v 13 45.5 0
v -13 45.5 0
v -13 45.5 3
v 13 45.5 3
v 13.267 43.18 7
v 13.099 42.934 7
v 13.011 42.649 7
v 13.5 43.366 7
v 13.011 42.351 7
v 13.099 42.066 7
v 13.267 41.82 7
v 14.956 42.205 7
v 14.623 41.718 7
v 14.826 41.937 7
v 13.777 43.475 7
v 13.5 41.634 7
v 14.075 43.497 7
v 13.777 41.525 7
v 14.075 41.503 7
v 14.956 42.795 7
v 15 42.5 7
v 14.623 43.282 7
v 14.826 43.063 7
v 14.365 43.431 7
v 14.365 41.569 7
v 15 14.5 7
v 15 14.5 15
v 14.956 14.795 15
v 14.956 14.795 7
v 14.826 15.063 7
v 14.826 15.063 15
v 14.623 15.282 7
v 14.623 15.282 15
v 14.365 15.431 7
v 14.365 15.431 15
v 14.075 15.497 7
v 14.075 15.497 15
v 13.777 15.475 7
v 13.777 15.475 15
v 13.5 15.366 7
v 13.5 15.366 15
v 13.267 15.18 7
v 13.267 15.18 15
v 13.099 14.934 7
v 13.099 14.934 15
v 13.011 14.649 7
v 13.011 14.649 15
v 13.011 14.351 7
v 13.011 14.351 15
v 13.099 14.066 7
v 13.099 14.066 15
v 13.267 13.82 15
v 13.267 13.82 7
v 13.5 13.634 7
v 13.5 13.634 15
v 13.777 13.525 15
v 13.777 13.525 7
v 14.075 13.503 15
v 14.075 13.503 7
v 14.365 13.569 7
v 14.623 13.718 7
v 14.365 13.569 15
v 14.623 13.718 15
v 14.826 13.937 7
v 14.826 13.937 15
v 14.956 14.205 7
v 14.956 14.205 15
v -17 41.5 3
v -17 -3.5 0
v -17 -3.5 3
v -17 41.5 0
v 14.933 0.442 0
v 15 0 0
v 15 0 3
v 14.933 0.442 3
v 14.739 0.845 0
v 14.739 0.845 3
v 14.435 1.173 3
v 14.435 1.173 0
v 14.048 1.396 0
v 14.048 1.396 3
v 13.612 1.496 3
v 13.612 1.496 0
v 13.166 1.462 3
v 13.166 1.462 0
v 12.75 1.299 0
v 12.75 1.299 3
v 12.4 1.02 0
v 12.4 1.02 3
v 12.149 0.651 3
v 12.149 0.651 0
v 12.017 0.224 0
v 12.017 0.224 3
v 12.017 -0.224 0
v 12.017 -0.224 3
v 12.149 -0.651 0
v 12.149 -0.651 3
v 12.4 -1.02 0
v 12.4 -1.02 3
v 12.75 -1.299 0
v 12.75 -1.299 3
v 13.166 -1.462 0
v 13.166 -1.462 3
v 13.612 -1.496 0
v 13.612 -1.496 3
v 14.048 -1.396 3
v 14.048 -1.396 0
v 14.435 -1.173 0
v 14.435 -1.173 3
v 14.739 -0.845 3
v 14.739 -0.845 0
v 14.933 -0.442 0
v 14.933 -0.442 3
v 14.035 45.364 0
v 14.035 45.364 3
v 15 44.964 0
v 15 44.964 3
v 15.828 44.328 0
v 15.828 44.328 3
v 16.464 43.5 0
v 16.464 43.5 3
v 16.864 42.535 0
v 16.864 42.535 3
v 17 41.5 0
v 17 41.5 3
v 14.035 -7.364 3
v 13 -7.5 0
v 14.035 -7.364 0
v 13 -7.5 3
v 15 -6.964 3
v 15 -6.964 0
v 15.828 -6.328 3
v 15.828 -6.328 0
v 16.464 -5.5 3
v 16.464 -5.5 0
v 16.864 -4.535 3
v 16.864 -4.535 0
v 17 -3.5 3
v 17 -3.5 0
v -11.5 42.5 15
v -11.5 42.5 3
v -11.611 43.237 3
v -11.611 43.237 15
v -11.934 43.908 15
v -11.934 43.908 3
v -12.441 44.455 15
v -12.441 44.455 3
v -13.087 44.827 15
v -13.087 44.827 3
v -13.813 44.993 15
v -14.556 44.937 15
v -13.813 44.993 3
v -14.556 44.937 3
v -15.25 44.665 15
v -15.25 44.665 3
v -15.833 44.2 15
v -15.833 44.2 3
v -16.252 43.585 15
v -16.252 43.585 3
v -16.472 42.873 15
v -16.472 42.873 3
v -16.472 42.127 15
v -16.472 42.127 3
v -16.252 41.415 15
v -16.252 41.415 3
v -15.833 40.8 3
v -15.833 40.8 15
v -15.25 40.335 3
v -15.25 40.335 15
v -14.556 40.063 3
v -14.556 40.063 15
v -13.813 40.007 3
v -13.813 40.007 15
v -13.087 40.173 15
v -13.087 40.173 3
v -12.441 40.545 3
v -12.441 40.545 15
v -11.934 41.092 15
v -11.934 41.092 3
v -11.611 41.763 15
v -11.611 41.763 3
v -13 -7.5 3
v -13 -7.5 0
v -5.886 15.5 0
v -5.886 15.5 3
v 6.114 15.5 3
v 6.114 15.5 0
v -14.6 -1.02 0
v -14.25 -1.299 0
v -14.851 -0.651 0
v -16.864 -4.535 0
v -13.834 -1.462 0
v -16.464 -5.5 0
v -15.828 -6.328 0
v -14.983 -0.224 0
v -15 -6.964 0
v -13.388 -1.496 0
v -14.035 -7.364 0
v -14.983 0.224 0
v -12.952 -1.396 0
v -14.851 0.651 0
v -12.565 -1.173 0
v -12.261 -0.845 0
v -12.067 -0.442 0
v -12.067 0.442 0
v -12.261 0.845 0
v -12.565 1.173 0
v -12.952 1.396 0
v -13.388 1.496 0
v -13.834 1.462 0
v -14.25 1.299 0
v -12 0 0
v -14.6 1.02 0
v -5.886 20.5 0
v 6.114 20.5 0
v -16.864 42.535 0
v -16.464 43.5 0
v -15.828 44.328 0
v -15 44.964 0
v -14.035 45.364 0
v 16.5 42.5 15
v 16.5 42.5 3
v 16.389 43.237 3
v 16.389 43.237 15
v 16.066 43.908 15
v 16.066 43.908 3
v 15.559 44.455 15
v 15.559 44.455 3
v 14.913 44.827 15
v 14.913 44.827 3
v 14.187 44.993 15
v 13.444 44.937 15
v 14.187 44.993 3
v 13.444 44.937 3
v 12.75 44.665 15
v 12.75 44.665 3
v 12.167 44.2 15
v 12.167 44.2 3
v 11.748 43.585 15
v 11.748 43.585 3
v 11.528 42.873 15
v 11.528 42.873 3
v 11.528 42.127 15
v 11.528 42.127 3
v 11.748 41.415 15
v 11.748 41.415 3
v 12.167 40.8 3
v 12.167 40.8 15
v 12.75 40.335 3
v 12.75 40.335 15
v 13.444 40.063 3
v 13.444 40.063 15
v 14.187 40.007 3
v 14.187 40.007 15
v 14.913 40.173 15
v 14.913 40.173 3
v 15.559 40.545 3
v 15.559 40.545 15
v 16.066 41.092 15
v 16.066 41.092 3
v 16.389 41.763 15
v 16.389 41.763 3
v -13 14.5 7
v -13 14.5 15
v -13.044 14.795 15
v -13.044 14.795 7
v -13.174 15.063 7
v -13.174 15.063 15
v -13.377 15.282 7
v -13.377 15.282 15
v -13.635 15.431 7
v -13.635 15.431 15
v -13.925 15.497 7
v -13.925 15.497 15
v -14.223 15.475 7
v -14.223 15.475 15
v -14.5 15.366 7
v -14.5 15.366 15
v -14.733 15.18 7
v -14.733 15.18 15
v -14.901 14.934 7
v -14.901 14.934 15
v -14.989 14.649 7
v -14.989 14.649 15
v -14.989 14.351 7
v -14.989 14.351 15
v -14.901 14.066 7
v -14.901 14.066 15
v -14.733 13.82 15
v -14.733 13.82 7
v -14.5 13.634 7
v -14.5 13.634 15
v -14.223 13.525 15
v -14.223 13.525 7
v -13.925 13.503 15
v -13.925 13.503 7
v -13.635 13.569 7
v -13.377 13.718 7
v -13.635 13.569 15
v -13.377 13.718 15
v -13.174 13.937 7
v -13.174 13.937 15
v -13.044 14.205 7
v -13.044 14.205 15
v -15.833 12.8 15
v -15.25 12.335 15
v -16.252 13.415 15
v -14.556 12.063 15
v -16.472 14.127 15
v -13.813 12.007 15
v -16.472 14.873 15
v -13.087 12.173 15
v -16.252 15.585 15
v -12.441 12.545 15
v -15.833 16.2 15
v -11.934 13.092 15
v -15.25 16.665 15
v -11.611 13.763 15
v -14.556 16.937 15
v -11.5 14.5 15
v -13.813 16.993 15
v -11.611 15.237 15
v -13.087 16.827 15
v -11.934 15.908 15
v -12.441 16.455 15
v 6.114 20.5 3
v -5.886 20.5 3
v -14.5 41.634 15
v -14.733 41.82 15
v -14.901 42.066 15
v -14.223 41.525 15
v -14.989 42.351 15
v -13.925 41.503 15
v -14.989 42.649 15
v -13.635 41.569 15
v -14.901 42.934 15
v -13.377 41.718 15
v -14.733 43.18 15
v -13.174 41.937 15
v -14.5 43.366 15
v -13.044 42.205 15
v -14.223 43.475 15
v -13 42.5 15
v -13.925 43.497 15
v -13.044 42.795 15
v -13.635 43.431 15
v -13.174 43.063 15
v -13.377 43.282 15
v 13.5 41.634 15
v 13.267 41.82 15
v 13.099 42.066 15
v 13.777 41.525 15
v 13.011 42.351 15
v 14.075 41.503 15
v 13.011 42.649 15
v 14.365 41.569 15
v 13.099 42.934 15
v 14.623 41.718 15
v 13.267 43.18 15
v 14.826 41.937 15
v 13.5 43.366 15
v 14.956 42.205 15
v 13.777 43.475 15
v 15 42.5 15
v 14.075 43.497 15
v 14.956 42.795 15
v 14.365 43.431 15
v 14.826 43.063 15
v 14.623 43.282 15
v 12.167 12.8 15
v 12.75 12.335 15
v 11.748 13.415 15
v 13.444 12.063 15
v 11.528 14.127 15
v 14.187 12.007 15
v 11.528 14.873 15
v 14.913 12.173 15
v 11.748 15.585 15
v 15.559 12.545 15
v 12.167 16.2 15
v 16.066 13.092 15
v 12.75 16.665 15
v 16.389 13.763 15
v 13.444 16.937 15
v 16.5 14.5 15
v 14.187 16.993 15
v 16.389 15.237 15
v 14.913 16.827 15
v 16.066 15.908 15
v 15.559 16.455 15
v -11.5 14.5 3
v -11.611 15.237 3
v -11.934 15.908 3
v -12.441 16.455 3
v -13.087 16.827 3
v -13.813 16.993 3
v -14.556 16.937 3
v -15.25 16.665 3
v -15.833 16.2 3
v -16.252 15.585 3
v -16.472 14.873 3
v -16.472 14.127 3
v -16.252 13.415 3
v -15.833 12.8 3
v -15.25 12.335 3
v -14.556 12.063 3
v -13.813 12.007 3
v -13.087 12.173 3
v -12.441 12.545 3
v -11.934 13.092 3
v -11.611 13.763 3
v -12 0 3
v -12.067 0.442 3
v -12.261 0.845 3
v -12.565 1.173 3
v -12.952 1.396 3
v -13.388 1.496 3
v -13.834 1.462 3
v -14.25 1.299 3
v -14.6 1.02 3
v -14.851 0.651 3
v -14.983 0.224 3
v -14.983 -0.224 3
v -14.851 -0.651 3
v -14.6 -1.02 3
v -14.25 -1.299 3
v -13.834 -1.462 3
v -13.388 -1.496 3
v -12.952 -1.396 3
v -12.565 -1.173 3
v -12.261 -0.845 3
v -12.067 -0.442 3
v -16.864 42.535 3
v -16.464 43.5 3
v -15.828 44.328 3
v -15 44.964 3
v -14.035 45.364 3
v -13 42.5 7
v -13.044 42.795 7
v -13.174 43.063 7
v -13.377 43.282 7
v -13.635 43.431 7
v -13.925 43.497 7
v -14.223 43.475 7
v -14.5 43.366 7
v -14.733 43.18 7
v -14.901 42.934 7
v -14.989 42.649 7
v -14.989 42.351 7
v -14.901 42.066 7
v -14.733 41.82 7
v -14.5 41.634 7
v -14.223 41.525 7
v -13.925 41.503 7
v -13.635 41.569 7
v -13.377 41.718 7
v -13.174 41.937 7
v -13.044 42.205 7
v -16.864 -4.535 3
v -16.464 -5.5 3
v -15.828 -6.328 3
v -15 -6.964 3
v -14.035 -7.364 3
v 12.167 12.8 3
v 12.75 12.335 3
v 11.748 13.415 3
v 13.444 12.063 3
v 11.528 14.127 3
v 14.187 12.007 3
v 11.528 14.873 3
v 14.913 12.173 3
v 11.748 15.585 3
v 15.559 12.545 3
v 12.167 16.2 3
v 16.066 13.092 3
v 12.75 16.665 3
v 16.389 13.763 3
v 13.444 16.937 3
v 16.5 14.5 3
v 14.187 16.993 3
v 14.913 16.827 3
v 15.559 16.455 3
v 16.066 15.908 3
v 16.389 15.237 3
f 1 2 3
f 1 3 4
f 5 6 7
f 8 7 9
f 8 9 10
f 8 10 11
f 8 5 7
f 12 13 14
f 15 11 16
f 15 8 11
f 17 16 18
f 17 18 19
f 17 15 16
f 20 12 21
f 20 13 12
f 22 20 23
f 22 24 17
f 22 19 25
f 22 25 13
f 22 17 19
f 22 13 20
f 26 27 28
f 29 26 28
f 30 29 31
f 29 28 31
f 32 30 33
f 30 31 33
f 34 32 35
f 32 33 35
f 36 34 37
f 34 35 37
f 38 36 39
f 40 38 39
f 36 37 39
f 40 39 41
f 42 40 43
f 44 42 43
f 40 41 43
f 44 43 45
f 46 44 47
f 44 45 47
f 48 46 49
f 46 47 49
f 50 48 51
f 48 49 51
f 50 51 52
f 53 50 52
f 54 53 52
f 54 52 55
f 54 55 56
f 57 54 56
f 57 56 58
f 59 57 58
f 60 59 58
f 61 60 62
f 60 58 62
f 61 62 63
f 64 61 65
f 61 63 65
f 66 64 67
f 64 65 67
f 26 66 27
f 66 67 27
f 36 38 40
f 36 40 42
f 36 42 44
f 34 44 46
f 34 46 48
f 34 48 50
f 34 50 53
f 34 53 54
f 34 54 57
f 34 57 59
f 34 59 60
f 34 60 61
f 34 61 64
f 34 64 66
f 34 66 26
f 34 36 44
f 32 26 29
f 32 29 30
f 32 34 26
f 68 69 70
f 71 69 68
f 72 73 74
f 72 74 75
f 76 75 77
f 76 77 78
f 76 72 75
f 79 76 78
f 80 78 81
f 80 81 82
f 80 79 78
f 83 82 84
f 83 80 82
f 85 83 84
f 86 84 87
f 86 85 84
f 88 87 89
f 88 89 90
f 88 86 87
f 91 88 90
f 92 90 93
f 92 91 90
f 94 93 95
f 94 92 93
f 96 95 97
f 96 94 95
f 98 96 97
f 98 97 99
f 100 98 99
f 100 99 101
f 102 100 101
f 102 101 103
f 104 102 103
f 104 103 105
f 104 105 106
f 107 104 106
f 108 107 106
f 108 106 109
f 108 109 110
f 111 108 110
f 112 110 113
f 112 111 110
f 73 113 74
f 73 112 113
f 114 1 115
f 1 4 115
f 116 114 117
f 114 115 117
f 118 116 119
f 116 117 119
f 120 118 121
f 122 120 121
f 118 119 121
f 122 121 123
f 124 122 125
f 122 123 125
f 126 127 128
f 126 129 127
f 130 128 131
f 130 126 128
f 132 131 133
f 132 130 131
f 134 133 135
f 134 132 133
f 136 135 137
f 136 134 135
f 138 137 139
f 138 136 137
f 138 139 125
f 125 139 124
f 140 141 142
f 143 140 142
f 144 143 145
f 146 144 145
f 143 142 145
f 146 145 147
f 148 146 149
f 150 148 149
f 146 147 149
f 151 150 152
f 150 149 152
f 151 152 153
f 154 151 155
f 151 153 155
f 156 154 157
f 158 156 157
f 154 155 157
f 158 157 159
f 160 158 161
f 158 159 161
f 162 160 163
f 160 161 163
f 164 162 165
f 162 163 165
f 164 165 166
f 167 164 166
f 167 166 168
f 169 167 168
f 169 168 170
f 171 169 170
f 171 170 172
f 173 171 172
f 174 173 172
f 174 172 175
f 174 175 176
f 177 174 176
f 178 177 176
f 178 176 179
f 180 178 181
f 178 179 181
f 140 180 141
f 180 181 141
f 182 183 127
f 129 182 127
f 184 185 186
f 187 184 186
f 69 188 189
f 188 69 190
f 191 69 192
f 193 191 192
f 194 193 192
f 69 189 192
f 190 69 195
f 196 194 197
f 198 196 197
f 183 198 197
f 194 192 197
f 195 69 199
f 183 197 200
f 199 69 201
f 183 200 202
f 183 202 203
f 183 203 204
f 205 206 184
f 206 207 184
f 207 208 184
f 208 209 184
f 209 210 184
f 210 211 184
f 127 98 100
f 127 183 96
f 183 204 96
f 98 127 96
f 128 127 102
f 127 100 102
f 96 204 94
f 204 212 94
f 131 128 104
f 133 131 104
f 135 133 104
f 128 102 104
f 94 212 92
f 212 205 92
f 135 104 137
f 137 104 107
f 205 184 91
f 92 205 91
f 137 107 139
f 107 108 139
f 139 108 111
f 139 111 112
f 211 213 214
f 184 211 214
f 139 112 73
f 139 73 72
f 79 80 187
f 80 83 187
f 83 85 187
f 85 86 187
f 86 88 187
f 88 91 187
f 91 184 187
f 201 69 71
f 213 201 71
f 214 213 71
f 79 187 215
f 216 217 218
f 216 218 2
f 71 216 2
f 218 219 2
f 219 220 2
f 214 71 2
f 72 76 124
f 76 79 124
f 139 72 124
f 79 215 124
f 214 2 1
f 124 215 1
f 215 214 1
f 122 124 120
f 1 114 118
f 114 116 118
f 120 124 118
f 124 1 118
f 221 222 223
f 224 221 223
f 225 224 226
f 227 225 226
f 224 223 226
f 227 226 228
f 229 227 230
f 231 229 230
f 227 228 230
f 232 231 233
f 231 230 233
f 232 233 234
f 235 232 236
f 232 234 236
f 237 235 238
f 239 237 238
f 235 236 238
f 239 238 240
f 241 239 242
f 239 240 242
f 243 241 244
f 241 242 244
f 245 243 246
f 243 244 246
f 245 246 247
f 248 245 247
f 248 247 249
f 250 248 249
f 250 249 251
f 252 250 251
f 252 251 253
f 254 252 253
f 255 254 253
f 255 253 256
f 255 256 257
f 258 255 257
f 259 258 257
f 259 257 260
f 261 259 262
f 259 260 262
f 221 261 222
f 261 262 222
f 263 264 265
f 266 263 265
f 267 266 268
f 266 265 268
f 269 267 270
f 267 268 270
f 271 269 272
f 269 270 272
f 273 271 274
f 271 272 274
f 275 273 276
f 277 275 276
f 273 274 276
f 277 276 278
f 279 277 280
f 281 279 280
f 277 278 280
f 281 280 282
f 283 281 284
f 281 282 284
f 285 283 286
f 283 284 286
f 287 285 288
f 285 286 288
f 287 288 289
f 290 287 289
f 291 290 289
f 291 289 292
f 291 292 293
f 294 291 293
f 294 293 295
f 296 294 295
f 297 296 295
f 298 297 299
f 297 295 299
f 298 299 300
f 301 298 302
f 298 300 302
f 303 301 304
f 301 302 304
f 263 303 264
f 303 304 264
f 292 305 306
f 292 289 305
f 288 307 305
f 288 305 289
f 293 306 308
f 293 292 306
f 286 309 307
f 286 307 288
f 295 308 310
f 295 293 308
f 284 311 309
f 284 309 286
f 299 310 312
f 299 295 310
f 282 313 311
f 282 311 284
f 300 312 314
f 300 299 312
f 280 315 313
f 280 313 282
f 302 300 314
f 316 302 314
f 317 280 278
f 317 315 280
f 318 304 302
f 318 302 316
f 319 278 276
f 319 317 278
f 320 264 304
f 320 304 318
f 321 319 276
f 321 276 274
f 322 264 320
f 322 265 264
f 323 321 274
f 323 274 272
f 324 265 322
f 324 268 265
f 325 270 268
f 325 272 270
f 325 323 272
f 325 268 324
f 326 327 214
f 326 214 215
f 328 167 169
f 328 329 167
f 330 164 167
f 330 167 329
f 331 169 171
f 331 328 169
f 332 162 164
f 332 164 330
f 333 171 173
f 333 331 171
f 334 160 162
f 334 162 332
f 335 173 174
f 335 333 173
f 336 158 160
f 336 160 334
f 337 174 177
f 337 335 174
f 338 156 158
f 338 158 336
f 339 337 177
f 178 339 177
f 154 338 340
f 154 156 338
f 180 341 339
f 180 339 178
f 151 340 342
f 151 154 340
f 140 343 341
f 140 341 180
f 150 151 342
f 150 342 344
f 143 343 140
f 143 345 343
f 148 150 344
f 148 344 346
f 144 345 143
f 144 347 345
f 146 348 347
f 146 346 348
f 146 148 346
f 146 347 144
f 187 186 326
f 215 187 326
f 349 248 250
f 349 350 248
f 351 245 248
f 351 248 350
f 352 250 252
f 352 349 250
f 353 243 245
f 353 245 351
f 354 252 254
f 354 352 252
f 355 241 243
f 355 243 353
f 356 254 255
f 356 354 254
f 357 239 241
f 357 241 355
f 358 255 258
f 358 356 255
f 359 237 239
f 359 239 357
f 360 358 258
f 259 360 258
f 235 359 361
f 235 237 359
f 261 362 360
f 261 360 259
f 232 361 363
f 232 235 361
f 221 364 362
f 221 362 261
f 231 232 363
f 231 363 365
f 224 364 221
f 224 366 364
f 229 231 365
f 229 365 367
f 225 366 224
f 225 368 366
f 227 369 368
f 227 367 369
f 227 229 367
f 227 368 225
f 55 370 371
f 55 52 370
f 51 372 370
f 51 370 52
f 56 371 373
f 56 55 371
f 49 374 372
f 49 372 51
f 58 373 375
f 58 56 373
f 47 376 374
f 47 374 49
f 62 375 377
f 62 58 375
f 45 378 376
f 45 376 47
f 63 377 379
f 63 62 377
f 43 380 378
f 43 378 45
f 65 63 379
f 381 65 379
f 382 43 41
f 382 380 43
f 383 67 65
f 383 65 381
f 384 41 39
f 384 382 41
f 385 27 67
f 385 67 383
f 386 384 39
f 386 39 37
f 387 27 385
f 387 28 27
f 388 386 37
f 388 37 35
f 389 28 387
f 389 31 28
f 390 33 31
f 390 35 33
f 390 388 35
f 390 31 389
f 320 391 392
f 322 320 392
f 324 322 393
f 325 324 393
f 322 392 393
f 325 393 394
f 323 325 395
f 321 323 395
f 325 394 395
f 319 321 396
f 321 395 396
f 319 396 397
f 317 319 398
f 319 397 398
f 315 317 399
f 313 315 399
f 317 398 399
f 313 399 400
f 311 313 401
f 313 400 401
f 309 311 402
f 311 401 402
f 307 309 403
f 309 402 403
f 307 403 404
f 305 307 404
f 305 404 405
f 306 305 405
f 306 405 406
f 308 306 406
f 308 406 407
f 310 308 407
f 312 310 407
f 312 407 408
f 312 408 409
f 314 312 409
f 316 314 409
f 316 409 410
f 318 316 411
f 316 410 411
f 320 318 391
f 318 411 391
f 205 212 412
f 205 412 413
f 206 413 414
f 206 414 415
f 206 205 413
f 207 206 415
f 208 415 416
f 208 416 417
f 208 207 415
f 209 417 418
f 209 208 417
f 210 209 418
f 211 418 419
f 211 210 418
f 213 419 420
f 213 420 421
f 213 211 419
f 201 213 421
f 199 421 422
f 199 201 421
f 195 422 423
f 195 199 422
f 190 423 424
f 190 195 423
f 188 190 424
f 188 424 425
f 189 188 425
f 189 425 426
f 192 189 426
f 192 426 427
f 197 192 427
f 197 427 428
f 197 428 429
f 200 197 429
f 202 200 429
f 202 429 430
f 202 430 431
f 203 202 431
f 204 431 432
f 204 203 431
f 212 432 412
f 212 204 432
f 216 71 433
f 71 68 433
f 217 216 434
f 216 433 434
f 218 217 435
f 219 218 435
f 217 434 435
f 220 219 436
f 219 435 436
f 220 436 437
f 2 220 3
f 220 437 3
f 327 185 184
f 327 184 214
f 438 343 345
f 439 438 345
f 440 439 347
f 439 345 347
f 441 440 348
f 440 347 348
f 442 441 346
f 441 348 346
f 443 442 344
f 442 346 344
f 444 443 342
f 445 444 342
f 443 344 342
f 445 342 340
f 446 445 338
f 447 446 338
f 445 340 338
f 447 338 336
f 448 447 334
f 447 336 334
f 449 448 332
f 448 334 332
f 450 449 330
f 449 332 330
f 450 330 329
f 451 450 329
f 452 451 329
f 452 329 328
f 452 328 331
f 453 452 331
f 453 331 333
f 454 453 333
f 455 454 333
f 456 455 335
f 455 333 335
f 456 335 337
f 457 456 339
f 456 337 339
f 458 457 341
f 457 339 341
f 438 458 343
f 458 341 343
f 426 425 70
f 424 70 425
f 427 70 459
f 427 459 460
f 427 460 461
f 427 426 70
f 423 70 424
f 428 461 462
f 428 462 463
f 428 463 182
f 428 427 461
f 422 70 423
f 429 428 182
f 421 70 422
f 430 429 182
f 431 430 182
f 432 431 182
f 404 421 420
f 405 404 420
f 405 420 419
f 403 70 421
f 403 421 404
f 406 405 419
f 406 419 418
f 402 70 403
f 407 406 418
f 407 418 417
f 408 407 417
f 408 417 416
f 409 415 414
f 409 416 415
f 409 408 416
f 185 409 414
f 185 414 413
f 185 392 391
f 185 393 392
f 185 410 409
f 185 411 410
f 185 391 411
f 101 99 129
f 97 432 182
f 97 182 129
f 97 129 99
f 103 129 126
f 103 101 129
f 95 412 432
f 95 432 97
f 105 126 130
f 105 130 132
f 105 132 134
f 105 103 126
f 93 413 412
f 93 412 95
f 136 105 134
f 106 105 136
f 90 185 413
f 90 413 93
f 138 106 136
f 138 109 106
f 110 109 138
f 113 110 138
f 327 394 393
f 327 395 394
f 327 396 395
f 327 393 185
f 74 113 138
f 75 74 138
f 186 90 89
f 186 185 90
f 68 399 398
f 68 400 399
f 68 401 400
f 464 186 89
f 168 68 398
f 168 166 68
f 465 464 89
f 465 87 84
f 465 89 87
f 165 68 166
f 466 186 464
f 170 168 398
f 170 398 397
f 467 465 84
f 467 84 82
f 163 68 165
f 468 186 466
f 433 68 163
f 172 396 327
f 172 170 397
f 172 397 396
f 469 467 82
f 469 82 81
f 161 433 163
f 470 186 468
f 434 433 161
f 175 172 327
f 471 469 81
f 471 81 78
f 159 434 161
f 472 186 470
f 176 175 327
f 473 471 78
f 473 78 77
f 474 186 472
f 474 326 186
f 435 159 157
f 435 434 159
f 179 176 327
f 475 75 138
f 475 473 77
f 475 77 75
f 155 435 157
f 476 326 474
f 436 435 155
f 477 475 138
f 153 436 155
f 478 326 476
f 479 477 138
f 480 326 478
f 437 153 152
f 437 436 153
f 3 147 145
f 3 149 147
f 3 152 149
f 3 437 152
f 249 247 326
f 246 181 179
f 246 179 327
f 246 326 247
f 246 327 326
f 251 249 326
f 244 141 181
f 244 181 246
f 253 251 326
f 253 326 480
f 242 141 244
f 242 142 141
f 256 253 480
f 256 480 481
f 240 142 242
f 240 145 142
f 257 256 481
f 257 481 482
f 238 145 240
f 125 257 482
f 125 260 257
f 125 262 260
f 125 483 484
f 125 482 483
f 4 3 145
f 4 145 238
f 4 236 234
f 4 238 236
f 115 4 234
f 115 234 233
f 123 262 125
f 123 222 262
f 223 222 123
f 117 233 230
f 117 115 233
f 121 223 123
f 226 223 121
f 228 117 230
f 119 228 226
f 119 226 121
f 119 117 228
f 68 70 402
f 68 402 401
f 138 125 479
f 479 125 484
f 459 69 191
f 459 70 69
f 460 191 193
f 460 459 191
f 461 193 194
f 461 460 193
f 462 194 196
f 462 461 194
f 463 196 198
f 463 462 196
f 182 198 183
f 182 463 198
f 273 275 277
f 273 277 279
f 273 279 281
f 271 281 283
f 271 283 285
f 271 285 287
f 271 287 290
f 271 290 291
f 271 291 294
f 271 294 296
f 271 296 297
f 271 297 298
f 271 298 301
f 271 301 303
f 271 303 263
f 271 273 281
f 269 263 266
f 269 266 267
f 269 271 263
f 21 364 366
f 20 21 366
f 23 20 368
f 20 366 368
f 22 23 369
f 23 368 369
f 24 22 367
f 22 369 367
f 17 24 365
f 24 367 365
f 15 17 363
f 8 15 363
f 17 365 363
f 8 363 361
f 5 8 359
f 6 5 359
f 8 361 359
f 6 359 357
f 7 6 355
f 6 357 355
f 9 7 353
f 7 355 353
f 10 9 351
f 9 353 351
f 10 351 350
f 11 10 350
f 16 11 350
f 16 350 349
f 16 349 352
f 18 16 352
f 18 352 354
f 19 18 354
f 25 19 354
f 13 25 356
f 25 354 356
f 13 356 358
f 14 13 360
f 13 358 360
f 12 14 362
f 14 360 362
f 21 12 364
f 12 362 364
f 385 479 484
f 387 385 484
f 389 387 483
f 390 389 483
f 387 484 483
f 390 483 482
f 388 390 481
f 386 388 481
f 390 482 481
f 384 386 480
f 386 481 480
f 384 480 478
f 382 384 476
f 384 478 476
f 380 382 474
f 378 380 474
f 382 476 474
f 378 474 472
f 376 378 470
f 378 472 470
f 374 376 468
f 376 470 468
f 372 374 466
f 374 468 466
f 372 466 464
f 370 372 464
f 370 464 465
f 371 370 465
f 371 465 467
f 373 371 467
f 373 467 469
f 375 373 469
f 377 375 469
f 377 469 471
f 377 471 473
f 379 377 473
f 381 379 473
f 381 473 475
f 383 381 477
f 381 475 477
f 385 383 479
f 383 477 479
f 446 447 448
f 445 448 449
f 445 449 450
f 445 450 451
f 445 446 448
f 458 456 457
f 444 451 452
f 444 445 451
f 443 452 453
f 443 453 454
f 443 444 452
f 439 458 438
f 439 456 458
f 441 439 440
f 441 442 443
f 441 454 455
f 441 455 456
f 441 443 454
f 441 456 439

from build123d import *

# Parameters (mm, degrees)
SKETCH_1_W          = 34
SKETCH_1_H          = 38
SKETCH_1_W_2        = 28
SKETCH_1_H_2        = 28
SKETCH_1_H_3        = 15
SKETCH_1_R          = 1.5
EXTRUDE_1_DEPTH     = 3
SKETCH_2_R          = 2.5
EXTRUDE_2_DEPTH     = 12
SKETCH_3_R          = 1
CUT_EXTRUDE_1_DEPTH = 8
FILLET_1_R          = 4
SKETCH_4_W          = 12
SKETCH_4_H          = 5
CUT_EXTRUDE_2_DEPTH = 8


with BuildPart() as part:
    # 草图1 → 凸台-拉伸1 (new body)
    # profile 1 of 3: a face of its own
    with BuildSketch(Plane.XY):
        with Locations((0, 26.5)):
            Rectangle(SKETCH_1_W, SKETCH_1_H)
        with Locations((0, 28.5)):
            Rectangle(SKETCH_1_W_2, SKETCH_1_H_2, mode=Mode.SUBTRACT)
    # profile 2 of 3: a face of its own
    with BuildSketch(Plane.XY):
        with Locations((0, 28.5)):
            Rectangle(SKETCH_1_W_2, SKETCH_1_H_2)
    # profile 3 of 3: a face of its own
    with BuildSketch(Plane.XY):
        Rectangle(SKETCH_1_W, SKETCH_1_H_3)
        with Locations((13.5, 0)):
            Circle(SKETCH_1_R, mode=Mode.SUBTRACT)
        with Locations((-13.5, 0)):
            Circle(SKETCH_1_R, mode=Mode.SUBTRACT)
    extrude(amount=EXTRUDE_1_DEPTH)

    # 草图2 → 凸台-拉伸2 (add)
    with BuildSketch(Plane.XY.offset(3)):
        with Locations((-14, 42.5)):
            Circle(SKETCH_2_R)
        with Locations((14, 42.5)):
            Circle(SKETCH_2_R)
        with Locations((-14, 14.5)):
            Circle(SKETCH_2_R)
        with Locations((14, 14.5)):
            Circle(SKETCH_2_R)
    extrude(amount=EXTRUDE_2_DEPTH)

    # 草图3 → 切除-拉伸1 (cut)
    with BuildSketch(Plane.XY.offset(15)):
        with Locations((-14, 42.5)):
            Circle(SKETCH_3_R)
        with Locations((14, 42.5)):
            Circle(SKETCH_3_R)
        with Locations((-14, 14.5)):
            Circle(SKETCH_3_R)
        with Locations((14, 14.5)):
            Circle(SKETCH_3_R)
    extrude(amount=-CUT_EXTRUDE_1_DEPTH, mode=Mode.SUBTRACT)

    # 圆角1
    fillet_1_edges = [part.edges().sort_by_distance(p)[0] for p in [
        (-17, 45.5, 1.5),
        (17, 45.5, 1.5),
        (17, -7.5, 1.5),
        (-17, -7.5, 1.5),
    ]]
    fillet(fillet_1_edges, radius=FILLET_1_R)

    # 草图4 → 切除-拉伸2 (cut)
    with BuildSketch(Plane.XY.offset(3)):
        with Locations((0.114195125, 18)):
            Rectangle(SKETCH_4_W, SKETCH_4_H)
    extrude(amount=-CUT_EXTRUDE_2_DEPTH, mode=Mode.SUBTRACT)


solid = part.part
